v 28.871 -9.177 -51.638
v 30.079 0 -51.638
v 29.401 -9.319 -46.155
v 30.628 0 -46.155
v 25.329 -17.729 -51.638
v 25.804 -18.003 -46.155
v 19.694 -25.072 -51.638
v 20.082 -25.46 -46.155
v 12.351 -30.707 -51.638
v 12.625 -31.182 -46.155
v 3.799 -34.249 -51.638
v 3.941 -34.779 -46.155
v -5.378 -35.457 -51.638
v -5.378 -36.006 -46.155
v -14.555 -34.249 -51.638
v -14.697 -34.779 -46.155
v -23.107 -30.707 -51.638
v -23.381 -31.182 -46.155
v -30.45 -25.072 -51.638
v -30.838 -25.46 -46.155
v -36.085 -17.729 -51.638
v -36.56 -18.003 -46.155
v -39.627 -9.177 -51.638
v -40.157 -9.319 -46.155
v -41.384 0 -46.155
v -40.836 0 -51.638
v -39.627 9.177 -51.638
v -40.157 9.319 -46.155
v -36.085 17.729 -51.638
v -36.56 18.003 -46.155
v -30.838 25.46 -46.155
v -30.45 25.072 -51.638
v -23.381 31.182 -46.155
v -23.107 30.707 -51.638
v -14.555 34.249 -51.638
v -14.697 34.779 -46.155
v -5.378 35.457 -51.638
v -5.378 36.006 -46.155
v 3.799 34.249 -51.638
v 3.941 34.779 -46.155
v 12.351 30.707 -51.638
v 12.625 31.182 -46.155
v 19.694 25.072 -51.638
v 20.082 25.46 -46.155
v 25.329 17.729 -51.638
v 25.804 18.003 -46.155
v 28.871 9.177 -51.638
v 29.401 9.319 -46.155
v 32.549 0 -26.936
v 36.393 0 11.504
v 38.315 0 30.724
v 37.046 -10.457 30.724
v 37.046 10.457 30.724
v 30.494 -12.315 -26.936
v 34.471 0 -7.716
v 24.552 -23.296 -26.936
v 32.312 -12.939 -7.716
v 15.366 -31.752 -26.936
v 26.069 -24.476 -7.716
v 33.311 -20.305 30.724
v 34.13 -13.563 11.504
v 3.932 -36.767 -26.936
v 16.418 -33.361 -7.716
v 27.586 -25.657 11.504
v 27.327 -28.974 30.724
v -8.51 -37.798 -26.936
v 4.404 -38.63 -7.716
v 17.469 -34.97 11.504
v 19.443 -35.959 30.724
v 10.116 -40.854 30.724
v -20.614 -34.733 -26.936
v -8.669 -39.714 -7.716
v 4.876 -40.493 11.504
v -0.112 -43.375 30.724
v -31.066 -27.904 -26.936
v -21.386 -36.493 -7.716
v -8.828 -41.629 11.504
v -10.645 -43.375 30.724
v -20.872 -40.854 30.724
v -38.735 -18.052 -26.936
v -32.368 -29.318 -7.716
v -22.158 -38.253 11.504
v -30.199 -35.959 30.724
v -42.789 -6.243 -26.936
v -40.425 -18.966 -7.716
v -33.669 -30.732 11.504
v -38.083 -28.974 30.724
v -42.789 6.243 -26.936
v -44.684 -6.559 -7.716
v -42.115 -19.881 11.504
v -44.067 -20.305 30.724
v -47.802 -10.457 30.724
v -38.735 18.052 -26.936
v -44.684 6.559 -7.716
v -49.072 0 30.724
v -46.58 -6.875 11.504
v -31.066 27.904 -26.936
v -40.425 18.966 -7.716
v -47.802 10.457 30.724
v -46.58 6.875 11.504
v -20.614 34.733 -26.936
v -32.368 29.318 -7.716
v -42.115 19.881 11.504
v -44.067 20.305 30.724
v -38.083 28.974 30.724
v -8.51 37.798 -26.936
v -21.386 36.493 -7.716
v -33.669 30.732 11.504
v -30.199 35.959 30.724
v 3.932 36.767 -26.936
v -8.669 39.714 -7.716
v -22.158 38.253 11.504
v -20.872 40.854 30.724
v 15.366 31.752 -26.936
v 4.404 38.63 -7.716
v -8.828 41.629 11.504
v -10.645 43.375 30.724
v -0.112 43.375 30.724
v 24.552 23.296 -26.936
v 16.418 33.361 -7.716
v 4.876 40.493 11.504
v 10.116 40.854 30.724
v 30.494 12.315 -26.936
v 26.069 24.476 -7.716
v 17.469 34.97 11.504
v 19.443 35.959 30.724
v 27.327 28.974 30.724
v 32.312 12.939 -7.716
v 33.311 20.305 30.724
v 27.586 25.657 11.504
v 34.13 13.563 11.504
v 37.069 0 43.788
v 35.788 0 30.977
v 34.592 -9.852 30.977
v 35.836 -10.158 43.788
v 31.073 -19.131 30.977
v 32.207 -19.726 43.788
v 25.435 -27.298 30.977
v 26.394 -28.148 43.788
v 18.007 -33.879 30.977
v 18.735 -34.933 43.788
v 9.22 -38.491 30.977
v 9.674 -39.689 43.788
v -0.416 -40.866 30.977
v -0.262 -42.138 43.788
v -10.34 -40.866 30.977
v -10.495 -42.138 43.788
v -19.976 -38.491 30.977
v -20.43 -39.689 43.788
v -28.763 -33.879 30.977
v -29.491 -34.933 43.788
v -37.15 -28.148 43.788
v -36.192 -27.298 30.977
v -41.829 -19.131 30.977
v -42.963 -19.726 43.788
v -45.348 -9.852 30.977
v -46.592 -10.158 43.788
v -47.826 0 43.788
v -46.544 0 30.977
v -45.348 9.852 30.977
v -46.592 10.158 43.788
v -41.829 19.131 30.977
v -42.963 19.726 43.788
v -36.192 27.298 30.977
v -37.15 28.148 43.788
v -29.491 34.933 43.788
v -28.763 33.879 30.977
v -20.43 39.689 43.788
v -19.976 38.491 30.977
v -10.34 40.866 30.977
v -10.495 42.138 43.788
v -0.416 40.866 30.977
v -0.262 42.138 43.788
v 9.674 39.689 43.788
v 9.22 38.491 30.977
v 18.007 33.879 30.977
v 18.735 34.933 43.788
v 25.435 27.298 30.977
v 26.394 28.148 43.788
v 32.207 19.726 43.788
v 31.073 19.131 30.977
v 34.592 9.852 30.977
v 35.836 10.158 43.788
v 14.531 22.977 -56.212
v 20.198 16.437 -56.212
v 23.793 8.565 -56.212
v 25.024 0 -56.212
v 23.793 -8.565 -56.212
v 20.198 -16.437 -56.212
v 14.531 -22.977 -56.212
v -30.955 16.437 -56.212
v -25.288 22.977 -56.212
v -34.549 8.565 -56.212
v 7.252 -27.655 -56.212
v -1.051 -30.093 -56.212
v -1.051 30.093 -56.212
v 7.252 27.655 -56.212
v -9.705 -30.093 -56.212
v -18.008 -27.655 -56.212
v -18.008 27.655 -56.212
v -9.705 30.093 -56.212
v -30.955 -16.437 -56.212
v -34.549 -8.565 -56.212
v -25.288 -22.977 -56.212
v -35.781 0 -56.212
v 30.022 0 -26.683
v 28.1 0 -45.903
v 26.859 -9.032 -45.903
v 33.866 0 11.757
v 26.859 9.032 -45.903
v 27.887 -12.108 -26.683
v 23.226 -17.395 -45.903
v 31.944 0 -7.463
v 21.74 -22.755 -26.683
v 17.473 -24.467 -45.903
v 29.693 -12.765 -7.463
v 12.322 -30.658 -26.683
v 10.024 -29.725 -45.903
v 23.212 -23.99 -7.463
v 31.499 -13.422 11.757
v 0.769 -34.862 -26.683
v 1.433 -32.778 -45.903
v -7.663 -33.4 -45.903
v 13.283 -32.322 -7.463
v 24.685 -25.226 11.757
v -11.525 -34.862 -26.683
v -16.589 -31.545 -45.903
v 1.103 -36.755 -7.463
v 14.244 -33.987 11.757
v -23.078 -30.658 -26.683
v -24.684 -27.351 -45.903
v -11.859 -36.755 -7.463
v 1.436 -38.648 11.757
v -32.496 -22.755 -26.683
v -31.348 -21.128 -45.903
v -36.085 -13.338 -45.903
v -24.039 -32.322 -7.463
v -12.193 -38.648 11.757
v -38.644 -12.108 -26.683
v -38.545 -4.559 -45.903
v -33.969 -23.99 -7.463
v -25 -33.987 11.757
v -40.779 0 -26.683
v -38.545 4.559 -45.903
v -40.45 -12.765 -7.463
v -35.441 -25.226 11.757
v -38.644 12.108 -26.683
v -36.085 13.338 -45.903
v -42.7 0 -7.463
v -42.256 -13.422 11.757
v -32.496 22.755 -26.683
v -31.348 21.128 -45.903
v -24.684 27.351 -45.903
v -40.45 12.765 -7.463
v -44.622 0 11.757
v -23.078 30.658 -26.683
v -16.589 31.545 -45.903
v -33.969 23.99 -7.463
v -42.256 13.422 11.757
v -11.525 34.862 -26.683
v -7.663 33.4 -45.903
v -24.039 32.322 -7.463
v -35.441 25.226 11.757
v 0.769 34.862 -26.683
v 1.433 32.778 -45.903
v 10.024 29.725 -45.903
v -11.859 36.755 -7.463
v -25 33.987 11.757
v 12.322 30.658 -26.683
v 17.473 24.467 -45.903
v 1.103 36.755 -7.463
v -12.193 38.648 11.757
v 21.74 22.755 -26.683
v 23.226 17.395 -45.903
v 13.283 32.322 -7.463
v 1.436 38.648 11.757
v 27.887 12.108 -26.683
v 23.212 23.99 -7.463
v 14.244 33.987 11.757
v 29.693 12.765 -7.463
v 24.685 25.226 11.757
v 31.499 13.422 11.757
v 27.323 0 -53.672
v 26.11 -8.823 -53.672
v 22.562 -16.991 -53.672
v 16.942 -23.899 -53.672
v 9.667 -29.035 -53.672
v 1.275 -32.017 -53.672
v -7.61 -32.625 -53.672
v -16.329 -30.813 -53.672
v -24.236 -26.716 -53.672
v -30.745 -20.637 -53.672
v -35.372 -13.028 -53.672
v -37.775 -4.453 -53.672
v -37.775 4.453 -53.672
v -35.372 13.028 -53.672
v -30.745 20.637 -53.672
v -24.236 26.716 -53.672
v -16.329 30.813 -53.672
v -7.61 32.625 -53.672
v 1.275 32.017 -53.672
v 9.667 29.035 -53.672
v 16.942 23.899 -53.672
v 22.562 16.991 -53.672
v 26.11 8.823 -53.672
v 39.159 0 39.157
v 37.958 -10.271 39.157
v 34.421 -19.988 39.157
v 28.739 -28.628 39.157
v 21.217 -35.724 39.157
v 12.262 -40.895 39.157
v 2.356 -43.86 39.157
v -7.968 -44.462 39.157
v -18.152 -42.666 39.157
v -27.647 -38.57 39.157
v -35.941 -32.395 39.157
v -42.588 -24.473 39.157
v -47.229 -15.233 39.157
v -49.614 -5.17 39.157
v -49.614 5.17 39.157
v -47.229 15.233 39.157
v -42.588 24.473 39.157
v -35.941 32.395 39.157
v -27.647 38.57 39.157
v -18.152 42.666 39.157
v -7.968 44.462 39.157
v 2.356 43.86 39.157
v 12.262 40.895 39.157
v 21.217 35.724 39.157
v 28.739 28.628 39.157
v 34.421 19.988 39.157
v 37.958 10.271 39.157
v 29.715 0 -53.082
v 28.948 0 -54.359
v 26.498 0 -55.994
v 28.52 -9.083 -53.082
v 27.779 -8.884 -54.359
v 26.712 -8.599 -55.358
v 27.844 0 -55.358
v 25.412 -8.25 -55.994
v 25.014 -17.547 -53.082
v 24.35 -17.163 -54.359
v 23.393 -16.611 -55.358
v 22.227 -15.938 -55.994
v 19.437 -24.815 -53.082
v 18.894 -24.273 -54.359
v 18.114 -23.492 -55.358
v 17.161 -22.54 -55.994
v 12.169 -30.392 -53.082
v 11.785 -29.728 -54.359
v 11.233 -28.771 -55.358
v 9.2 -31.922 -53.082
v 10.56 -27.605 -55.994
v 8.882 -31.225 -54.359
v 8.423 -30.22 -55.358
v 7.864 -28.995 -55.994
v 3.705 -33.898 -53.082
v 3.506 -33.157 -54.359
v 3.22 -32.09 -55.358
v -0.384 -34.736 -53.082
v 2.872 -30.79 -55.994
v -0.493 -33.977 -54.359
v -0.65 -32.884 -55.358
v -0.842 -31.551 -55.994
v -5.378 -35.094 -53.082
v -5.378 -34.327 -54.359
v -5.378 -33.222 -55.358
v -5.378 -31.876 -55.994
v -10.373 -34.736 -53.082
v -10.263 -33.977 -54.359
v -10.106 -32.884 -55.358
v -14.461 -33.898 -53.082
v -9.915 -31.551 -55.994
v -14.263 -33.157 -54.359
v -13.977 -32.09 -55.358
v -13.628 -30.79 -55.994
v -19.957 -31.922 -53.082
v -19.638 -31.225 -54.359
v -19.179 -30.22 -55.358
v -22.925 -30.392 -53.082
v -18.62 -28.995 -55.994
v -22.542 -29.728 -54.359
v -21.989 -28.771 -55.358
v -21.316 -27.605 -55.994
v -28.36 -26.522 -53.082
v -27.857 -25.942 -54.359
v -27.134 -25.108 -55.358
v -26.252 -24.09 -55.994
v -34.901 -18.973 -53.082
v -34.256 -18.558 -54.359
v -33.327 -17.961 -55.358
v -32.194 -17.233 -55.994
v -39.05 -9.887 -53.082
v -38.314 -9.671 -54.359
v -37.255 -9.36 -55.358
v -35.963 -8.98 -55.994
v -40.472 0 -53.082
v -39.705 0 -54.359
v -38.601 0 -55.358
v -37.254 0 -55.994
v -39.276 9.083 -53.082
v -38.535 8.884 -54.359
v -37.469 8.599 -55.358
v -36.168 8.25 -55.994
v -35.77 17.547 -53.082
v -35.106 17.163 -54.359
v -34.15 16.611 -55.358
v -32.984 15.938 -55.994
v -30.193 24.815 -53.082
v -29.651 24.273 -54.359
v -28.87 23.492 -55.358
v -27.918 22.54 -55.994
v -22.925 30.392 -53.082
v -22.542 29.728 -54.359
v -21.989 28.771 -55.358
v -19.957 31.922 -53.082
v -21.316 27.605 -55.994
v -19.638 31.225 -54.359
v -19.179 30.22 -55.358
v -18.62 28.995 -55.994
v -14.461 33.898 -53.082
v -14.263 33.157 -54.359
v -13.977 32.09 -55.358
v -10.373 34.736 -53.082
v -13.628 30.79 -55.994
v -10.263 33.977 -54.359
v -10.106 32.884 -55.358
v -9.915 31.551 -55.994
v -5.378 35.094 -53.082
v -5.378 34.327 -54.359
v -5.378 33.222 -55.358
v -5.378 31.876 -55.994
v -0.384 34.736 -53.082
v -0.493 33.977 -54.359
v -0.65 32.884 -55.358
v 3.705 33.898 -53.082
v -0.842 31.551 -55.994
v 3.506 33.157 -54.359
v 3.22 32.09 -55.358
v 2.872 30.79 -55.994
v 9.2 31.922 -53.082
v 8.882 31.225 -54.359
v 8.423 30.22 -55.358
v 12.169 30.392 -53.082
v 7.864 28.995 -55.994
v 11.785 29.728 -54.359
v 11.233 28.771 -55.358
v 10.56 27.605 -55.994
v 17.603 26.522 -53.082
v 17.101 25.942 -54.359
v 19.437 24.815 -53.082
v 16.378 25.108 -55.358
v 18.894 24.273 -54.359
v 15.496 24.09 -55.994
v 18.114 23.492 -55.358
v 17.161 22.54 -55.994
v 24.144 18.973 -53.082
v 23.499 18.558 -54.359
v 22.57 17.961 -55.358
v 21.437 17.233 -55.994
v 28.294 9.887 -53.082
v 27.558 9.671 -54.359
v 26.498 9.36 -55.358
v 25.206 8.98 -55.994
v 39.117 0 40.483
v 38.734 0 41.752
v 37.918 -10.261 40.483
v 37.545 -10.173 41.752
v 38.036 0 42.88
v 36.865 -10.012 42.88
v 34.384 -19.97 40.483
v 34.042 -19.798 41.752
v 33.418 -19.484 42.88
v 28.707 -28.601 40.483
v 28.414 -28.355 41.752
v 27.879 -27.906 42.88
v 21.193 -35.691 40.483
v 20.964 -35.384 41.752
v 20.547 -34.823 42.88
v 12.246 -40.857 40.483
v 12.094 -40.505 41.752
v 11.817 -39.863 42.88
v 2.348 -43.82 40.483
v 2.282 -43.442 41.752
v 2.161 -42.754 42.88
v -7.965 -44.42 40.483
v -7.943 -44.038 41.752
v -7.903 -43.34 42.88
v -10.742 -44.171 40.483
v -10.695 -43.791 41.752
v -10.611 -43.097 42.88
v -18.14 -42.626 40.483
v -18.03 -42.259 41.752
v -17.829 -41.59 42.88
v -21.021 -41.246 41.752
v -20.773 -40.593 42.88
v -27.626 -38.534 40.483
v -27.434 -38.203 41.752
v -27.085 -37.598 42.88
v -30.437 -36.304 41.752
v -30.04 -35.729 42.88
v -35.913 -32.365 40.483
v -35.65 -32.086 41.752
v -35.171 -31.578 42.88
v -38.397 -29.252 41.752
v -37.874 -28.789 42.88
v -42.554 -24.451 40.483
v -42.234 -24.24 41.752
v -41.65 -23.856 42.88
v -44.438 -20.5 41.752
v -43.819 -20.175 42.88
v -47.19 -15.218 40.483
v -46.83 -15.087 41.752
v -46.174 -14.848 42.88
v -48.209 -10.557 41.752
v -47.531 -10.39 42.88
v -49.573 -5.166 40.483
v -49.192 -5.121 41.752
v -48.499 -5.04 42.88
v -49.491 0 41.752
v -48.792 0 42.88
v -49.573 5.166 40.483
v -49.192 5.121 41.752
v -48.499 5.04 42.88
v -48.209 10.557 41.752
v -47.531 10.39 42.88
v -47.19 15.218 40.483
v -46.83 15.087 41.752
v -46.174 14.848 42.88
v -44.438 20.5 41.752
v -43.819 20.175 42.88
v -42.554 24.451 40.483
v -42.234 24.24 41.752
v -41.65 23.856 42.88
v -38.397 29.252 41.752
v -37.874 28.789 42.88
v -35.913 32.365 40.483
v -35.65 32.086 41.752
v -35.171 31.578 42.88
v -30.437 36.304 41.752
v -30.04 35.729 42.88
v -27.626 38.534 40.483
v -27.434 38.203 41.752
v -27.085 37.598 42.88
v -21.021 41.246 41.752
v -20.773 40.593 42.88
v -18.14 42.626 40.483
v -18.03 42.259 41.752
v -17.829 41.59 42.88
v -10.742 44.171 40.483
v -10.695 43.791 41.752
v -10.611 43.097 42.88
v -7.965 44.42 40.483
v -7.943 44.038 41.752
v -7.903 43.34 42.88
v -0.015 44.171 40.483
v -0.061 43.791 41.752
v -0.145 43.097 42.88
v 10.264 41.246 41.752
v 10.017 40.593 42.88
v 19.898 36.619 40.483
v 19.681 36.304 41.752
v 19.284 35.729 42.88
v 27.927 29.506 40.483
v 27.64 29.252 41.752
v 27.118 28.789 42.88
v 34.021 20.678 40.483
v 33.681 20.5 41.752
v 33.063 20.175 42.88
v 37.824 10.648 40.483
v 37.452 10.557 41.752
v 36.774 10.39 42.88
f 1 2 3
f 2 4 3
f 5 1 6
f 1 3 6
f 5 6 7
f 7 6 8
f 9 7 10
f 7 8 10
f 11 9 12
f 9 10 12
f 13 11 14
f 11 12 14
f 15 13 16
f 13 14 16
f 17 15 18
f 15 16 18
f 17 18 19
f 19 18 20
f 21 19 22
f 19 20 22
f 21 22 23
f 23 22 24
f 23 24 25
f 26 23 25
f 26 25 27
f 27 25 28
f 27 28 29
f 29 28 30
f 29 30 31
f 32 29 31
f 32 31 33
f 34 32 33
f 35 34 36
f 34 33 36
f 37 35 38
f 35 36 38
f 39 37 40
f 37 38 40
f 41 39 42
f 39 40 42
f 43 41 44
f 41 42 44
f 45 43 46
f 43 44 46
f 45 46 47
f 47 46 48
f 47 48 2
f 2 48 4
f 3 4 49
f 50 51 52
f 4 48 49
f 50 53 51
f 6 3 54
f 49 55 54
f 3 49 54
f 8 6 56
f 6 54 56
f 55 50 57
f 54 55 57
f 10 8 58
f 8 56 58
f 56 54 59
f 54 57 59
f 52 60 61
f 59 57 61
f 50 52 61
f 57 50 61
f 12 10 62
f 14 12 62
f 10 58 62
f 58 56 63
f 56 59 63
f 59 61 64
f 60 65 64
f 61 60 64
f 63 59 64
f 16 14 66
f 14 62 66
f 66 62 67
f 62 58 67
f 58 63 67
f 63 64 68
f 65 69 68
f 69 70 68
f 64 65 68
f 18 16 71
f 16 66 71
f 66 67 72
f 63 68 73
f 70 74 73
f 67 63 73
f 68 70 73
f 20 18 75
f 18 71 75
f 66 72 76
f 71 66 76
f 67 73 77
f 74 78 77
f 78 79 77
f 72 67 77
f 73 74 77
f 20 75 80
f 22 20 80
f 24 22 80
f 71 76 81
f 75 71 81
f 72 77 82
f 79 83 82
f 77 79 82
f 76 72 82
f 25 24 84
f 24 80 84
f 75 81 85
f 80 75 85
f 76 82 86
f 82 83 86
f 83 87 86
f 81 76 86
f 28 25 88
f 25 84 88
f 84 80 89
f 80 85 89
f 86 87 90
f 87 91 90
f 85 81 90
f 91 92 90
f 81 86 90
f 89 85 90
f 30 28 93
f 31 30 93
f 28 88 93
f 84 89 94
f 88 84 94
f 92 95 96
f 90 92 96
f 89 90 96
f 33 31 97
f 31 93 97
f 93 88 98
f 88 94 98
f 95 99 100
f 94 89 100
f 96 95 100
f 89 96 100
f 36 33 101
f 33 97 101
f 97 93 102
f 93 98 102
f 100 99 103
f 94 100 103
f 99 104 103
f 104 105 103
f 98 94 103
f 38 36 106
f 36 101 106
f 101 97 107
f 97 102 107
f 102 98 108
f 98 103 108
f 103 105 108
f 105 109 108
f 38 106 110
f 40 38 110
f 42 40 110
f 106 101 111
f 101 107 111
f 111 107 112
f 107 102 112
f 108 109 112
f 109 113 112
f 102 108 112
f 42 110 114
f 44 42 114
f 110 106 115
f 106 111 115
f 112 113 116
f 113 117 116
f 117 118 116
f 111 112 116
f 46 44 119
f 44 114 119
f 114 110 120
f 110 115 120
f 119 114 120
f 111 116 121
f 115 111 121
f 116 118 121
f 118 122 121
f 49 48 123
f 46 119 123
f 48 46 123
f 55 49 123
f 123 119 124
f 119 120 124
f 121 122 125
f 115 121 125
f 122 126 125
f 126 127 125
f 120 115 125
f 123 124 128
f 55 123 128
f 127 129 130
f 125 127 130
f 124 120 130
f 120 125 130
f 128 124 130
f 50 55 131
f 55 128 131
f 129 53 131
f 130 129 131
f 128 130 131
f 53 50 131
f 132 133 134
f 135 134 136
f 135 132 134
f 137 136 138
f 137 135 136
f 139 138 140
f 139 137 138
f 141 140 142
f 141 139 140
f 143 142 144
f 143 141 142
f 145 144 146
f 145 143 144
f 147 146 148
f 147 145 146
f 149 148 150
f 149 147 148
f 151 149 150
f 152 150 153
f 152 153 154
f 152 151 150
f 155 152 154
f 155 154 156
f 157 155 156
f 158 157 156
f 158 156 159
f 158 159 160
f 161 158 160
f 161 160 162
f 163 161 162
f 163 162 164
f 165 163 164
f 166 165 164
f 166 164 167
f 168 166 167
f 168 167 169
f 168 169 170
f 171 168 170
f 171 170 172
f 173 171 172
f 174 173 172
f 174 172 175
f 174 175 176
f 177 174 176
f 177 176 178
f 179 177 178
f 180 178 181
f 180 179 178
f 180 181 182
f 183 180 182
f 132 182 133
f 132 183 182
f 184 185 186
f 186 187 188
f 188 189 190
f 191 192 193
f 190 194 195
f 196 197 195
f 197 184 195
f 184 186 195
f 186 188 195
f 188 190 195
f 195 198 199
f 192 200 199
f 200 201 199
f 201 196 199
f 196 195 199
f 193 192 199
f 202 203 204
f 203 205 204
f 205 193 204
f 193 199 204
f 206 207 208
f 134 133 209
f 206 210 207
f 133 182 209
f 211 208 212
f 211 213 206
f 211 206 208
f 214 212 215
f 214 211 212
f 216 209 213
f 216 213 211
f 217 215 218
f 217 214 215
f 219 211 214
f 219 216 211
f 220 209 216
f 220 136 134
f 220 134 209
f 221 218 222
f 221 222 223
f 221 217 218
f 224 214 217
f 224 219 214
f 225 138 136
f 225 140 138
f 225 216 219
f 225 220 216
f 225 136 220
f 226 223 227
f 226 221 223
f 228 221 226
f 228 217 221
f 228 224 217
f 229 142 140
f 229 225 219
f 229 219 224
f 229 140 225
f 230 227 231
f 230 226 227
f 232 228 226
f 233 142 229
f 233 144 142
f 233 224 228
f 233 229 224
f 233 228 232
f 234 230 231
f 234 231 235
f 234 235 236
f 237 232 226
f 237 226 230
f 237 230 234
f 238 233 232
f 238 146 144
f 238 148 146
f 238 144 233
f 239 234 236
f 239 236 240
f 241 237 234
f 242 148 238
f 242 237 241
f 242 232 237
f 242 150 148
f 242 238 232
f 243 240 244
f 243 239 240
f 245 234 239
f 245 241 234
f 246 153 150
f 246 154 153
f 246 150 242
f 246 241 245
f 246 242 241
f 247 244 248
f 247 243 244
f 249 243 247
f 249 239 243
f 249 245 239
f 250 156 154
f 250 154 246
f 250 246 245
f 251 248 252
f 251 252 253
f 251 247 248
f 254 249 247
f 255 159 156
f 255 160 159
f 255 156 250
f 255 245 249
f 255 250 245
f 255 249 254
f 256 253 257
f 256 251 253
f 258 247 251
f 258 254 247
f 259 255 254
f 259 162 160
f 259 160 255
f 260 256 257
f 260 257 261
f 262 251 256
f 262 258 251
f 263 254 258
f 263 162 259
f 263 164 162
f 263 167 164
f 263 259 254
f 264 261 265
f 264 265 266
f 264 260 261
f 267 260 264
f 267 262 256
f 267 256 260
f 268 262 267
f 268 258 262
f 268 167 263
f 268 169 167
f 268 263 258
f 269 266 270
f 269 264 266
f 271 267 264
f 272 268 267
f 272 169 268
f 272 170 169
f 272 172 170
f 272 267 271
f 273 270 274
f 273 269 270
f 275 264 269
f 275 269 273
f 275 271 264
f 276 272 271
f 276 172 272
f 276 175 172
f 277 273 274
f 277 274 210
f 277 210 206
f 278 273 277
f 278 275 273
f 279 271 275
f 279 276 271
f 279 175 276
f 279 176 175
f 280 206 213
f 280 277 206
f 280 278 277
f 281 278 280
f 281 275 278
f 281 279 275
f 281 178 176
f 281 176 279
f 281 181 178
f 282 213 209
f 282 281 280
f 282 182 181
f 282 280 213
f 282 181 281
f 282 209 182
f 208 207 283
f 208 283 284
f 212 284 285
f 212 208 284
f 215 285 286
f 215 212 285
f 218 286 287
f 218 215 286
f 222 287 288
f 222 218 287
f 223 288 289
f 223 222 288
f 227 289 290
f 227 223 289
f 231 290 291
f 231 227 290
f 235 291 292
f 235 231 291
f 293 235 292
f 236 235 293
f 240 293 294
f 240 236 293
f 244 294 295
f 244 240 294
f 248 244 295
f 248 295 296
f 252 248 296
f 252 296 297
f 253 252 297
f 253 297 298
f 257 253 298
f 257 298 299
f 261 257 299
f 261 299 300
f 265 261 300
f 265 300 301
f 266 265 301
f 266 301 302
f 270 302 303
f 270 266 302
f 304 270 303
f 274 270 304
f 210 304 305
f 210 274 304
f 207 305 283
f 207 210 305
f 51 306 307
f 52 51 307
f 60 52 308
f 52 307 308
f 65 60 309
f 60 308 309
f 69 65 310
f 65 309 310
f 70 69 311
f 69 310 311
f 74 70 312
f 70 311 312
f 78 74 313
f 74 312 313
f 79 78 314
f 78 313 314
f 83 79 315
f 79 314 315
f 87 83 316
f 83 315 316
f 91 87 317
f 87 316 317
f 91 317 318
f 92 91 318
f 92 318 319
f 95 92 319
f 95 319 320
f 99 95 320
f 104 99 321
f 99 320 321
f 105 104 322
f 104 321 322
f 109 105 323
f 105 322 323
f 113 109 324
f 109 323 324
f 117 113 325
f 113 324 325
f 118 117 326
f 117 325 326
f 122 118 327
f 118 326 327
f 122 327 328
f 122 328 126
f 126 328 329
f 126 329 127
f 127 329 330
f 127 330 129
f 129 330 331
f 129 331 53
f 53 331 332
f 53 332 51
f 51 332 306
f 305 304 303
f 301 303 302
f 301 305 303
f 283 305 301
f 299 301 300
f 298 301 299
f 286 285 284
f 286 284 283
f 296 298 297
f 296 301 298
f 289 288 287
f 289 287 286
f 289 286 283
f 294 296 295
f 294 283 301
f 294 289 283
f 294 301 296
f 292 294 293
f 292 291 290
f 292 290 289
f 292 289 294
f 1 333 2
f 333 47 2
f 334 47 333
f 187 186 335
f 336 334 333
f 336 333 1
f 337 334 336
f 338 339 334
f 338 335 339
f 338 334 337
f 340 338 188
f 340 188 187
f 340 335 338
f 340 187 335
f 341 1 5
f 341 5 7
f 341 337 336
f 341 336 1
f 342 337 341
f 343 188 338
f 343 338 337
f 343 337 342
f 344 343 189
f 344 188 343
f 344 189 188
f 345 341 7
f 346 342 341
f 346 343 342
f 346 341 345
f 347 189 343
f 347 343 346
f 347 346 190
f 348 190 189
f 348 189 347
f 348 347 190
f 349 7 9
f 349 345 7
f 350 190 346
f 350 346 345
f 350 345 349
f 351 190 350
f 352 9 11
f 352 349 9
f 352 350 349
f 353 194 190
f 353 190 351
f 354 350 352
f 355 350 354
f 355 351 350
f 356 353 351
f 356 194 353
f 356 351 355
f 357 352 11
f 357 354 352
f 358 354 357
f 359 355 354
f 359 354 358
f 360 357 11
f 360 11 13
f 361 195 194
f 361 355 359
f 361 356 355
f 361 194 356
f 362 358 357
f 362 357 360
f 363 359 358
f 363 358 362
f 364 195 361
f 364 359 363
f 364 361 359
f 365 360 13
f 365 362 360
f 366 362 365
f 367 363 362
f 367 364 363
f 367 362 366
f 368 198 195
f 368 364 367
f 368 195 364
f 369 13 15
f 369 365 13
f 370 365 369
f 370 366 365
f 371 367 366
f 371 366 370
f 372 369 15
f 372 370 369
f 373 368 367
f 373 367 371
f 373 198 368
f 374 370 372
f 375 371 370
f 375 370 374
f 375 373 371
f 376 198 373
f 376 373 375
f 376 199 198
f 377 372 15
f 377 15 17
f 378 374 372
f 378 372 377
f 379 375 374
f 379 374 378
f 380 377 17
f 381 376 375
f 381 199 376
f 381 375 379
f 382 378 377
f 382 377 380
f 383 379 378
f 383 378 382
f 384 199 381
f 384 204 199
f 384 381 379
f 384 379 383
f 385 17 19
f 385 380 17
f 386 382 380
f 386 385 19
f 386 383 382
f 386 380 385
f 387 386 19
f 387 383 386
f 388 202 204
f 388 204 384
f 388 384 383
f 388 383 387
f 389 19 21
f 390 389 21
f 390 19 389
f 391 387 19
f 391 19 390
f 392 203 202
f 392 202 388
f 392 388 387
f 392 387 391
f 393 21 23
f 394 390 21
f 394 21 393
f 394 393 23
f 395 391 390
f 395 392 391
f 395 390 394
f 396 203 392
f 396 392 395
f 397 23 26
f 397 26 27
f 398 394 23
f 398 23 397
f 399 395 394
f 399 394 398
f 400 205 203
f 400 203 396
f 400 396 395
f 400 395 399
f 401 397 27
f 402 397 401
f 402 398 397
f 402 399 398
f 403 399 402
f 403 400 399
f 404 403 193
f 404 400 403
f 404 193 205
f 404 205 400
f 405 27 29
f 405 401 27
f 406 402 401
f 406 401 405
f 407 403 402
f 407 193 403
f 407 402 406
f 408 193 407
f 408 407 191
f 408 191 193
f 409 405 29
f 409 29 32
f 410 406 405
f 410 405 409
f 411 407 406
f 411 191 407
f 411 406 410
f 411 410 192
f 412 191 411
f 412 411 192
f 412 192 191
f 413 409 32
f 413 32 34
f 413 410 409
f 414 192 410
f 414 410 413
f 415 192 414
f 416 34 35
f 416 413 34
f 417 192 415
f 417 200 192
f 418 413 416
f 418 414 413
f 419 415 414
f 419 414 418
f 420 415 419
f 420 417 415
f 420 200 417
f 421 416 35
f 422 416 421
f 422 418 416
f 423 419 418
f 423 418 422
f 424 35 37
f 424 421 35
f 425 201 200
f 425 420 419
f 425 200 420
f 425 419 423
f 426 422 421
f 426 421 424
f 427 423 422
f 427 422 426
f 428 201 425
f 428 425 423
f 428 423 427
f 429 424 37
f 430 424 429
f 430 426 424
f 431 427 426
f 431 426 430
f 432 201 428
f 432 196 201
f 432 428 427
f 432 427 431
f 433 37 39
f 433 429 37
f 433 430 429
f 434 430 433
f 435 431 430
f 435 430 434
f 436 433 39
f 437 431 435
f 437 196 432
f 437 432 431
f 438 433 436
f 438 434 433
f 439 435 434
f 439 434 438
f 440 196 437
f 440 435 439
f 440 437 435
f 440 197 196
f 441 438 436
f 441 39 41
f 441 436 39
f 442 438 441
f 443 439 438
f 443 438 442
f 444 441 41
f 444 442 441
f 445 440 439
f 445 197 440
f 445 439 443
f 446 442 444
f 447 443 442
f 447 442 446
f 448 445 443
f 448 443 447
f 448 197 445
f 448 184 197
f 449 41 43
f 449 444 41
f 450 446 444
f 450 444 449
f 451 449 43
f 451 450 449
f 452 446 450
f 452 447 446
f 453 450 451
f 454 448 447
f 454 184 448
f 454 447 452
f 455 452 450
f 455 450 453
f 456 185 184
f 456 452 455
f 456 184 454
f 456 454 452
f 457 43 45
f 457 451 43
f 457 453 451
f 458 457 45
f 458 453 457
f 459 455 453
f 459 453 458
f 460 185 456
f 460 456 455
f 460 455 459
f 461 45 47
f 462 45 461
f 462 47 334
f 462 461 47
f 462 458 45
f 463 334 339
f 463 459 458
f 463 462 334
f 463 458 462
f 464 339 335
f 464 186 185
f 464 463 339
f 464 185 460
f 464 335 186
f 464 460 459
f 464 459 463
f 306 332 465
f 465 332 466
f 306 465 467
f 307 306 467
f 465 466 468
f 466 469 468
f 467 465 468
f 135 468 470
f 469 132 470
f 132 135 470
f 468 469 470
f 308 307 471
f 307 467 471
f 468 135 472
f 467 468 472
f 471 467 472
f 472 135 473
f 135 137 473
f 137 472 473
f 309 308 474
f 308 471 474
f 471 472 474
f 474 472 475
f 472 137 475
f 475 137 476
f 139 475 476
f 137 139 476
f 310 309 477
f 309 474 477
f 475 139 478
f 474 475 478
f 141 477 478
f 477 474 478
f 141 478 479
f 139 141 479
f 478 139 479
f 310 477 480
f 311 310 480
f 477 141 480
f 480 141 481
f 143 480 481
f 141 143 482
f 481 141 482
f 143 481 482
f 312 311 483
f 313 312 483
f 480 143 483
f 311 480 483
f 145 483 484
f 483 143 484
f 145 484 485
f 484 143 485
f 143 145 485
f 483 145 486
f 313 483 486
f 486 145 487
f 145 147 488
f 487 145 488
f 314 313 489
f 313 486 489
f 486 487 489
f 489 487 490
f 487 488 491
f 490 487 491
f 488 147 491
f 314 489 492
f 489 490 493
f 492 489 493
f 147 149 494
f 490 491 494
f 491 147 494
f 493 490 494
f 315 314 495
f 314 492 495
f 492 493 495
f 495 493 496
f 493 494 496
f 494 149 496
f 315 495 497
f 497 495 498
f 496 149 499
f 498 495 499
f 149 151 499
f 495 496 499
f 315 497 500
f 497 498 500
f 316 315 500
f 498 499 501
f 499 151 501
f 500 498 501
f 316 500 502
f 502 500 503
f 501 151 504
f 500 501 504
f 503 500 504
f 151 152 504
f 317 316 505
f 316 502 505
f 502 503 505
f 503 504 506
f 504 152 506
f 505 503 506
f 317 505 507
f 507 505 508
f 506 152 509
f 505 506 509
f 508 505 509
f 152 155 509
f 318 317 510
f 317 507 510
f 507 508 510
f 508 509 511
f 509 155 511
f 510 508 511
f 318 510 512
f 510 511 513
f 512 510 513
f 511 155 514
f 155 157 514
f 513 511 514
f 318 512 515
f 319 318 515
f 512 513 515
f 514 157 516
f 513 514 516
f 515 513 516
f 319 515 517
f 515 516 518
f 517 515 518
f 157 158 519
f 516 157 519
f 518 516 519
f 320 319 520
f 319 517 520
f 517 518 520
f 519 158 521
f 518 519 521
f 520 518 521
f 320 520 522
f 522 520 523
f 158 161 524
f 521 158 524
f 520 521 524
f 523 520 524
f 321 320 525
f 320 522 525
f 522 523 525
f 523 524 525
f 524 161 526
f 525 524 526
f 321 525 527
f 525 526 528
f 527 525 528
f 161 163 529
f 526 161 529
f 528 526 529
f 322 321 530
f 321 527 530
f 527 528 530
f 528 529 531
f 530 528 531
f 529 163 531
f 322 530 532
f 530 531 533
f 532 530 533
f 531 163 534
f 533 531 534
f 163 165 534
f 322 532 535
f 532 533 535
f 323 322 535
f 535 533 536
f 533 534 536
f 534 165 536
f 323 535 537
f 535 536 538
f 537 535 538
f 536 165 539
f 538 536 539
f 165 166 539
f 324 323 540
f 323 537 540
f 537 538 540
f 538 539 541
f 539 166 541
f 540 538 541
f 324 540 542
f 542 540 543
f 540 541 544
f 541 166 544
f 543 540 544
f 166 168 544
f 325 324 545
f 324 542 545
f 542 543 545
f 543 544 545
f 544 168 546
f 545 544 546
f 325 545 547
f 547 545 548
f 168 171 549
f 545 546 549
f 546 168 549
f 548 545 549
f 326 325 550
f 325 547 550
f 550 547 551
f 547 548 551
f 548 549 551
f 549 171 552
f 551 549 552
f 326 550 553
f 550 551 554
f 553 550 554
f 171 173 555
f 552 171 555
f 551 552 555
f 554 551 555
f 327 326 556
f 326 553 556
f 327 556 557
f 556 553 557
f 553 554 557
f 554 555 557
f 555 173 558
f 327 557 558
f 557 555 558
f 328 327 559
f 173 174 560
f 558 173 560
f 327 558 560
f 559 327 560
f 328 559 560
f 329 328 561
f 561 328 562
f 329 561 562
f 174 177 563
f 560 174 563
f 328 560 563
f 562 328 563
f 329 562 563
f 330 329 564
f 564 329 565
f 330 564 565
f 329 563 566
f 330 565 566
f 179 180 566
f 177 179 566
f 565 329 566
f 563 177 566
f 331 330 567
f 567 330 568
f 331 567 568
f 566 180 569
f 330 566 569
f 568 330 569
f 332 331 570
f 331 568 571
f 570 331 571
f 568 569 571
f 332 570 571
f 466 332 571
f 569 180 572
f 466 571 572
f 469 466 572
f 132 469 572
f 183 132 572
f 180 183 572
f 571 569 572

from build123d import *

# Parameters (mm, degrees)
F2_T = -2.54


# Not quite as in the source:
# - a fillet or chamfer that OpenCascade refuses, or shapes differently, is made with other operations: its cross-section is extruded or revolved along the edge and cut away or added
# - the program builds the solid bodies; features that only make, move or delete a surface that nothing else refers to are left out


with BuildPart() as f1:
    # F0 (on Front) → F1 (revolve)
    with BuildSketch(Plane.XZ):
        Polygon((39.6217921842, 43.7875076047), (-5.3782078158, 43.7875076047), (-5.3782078158, -56.2124923953), (29.6217921842, -56.2124923953), (30.6275011268, -46.1554029698), (38.3154473181, 30.724058944), align=None)
    revolve(axis=Axis((-5.3782078158, 0, -6.2124923953), (0, 0, -1)))

    # F2
    f2_openings = [f1.faces().sort_by_distance(p)[0] for p in [
        (-5.378208, 0, 43.787508),
    ]]
    offset(amount=F2_T, openings=f2_openings, kind=Kind.INTERSECTION)

    # F3: fillet of radius 5.08 on 3 edges, made by hand

    # F3_s1 → F3_t2 (revolve, cut)
    with BuildSketch(Plane.XZ):
        with BuildLine():
            ThreePointArc((30.079244295, -51.6379712879), (28.4331623981, -54.8990712658), (25.0244553687, -56.2124923953))
            Line((25.0244553687, -56.2124923953), (29.6217921842, -56.2124923953))
            Line((29.6217921842, -56.2124923953), (30.079244295, -51.6379712879))
        make_face()
    revolve(axis=Axis((-5.3782078158, 0, -56.2124923953), (0, 0, -1)), mode=Mode.SUBTRACT)

    # F3_s3 → F3_t4 (revolve, cut)
    with BuildSketch(Plane.XZ):
        with BuildLine():
            ThreePointArc((39.1587606775, 39.1571925375), (38.7342868185, 41.7523083311), (37.0691237764, 43.7875076047))
            Line((37.0691237764, 43.7875076047), (39.6217921842, 43.7875076047))
            Line((39.6217921842, 43.7875076047), (39.1587606775, 39.1571925375))
        make_face()
    revolve(axis=Axis((-5.3782078158, 0, 43.7875076047), (0, 0, -1)), mode=Mode.SUBTRACT)


solid = f1.part
